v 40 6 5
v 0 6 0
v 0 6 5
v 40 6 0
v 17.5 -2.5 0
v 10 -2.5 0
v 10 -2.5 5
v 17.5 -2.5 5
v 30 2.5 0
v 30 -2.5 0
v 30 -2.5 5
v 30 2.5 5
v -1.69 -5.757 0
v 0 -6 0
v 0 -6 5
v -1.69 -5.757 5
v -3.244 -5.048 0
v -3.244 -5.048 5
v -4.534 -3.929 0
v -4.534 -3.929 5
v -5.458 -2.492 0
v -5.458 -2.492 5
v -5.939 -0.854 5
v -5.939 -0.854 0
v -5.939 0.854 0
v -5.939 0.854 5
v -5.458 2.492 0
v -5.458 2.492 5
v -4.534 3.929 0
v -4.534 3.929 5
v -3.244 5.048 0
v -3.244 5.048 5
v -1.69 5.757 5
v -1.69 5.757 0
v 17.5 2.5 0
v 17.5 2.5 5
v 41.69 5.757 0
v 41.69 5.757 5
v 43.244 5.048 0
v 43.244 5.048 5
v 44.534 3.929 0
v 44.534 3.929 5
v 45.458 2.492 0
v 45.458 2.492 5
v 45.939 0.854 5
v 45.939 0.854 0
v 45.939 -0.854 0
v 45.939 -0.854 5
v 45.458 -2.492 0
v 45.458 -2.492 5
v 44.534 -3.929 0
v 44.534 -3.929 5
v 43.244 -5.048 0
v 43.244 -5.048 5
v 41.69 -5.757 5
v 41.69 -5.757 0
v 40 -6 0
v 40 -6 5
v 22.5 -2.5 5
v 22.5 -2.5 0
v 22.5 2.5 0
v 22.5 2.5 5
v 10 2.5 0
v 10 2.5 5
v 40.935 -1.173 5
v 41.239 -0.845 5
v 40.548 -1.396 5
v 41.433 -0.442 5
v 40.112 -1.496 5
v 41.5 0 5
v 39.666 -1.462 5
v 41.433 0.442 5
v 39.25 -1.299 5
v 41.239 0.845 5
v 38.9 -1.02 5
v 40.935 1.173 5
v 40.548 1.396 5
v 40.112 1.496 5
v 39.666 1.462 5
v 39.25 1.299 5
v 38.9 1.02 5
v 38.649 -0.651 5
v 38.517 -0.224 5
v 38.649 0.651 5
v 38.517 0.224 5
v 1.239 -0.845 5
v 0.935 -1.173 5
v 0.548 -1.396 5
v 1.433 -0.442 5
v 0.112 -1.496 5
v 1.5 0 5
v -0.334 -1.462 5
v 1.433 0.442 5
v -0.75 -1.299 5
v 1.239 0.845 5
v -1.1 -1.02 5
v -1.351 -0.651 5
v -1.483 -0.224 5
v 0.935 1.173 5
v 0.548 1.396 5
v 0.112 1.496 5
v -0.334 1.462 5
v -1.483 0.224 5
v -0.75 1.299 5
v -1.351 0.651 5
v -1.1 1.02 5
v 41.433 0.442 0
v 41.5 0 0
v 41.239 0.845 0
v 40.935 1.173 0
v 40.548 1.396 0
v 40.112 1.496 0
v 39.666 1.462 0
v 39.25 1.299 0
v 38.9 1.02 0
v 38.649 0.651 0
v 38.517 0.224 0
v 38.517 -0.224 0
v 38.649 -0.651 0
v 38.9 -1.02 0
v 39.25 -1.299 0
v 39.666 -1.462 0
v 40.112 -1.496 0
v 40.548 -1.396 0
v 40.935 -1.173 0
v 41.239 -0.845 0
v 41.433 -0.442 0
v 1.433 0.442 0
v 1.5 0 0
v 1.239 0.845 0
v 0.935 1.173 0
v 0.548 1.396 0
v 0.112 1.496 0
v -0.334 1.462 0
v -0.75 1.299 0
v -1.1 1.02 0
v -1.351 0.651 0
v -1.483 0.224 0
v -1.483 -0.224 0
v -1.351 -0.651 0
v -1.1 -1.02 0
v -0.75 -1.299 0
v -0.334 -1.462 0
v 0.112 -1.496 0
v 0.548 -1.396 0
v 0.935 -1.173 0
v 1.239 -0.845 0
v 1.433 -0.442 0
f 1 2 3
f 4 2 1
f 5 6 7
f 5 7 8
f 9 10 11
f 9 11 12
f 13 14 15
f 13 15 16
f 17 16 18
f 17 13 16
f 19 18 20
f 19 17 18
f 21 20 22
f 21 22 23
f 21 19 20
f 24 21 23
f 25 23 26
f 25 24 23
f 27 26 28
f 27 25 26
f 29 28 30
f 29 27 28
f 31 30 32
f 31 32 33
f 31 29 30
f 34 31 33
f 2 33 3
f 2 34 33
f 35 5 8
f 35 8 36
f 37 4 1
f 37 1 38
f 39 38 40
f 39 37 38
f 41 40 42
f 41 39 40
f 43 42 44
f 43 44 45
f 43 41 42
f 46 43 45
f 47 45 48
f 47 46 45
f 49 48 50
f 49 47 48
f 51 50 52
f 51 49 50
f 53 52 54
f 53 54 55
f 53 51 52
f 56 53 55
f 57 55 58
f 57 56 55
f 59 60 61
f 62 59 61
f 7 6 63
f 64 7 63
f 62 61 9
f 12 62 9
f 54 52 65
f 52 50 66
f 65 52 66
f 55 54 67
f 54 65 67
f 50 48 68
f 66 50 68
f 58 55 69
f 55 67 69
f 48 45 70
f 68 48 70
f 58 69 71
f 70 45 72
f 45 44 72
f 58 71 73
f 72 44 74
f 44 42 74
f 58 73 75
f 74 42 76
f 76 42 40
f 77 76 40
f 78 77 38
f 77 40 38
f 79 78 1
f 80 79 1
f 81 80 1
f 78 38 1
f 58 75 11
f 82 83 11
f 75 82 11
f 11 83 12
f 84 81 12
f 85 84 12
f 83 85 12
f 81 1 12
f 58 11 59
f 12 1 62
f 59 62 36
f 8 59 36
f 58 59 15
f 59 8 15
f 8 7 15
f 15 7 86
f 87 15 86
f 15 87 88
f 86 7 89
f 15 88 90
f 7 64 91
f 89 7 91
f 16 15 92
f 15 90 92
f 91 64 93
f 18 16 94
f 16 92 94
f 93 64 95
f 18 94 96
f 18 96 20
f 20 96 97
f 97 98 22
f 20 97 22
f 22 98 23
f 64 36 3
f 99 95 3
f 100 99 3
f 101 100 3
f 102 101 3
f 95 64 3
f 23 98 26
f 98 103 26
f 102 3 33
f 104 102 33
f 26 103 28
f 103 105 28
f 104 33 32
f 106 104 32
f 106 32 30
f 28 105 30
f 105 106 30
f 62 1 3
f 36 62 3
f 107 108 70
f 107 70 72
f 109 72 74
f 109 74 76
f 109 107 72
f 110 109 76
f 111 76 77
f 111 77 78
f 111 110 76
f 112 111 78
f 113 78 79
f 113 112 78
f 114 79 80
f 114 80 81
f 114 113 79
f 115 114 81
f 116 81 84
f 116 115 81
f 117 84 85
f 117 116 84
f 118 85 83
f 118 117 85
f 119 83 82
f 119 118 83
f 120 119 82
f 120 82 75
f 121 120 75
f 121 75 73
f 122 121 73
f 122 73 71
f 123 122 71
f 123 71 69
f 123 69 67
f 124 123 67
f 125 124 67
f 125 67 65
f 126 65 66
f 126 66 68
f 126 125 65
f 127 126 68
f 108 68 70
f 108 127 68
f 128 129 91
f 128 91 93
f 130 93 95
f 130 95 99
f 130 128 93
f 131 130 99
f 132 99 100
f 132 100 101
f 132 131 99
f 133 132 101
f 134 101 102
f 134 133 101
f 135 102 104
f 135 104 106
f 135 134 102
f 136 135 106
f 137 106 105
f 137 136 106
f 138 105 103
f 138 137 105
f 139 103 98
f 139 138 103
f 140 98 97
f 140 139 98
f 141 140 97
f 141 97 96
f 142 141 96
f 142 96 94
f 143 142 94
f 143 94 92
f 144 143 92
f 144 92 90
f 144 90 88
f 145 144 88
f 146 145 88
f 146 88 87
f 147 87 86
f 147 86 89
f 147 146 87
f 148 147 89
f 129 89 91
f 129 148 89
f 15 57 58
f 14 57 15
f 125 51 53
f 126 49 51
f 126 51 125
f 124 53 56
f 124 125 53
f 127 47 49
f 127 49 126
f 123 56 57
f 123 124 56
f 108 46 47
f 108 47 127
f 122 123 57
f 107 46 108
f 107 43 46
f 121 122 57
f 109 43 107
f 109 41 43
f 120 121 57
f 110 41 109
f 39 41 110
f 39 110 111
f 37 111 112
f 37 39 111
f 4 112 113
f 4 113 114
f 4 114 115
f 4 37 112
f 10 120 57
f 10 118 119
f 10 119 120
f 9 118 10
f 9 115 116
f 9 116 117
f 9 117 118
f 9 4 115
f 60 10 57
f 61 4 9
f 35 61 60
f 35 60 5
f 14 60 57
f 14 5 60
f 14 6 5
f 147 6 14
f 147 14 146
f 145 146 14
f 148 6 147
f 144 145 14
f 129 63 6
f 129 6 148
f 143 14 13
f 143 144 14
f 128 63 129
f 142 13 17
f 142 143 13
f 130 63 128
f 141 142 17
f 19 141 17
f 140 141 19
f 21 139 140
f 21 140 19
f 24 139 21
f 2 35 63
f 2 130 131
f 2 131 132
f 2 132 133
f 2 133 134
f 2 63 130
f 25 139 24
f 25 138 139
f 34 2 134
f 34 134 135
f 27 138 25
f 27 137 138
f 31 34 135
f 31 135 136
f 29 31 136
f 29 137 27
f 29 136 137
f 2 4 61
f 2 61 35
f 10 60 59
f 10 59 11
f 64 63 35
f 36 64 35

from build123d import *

# Parameters (mm, degrees)
ESQUISSE1_R        = 1.5
ESQUISSE1_W        = 7.5
ESQUISSE1_H        = 5
BOSS_EXTRU_1_DEPTH = 5


with BuildPart() as part:
    # Esquisse1 → Boss.-Extru.1 (new body)
    with BuildSketch(Plane.XY):
        with BuildLine():
            Line((40, -6), (0, -6))
            ThreePointArc((0, -6), (-6, 0), (0, 6))
            Line((0, 6), (40, 6))
            ThreePointArc((40, 6), (46, 0), (40, -6))
        make_face()
        with Locations((40, 0)):
            Circle(ESQUISSE1_R, mode=Mode.SUBTRACT)
        Circle(ESQUISSE1_R, mode=Mode.SUBTRACT)
        with Locations((26.25, 0)):
            Rectangle(ESQUISSE1_W, ESQUISSE1_H, mode=Mode.SUBTRACT)
        with Locations((13.75, 0)):
            Rectangle(ESQUISSE1_W, ESQUISSE1_H, mode=Mode.SUBTRACT)
    extrude(amount=BOSS_EXTRU_1_DEPTH)


solid = part.part
